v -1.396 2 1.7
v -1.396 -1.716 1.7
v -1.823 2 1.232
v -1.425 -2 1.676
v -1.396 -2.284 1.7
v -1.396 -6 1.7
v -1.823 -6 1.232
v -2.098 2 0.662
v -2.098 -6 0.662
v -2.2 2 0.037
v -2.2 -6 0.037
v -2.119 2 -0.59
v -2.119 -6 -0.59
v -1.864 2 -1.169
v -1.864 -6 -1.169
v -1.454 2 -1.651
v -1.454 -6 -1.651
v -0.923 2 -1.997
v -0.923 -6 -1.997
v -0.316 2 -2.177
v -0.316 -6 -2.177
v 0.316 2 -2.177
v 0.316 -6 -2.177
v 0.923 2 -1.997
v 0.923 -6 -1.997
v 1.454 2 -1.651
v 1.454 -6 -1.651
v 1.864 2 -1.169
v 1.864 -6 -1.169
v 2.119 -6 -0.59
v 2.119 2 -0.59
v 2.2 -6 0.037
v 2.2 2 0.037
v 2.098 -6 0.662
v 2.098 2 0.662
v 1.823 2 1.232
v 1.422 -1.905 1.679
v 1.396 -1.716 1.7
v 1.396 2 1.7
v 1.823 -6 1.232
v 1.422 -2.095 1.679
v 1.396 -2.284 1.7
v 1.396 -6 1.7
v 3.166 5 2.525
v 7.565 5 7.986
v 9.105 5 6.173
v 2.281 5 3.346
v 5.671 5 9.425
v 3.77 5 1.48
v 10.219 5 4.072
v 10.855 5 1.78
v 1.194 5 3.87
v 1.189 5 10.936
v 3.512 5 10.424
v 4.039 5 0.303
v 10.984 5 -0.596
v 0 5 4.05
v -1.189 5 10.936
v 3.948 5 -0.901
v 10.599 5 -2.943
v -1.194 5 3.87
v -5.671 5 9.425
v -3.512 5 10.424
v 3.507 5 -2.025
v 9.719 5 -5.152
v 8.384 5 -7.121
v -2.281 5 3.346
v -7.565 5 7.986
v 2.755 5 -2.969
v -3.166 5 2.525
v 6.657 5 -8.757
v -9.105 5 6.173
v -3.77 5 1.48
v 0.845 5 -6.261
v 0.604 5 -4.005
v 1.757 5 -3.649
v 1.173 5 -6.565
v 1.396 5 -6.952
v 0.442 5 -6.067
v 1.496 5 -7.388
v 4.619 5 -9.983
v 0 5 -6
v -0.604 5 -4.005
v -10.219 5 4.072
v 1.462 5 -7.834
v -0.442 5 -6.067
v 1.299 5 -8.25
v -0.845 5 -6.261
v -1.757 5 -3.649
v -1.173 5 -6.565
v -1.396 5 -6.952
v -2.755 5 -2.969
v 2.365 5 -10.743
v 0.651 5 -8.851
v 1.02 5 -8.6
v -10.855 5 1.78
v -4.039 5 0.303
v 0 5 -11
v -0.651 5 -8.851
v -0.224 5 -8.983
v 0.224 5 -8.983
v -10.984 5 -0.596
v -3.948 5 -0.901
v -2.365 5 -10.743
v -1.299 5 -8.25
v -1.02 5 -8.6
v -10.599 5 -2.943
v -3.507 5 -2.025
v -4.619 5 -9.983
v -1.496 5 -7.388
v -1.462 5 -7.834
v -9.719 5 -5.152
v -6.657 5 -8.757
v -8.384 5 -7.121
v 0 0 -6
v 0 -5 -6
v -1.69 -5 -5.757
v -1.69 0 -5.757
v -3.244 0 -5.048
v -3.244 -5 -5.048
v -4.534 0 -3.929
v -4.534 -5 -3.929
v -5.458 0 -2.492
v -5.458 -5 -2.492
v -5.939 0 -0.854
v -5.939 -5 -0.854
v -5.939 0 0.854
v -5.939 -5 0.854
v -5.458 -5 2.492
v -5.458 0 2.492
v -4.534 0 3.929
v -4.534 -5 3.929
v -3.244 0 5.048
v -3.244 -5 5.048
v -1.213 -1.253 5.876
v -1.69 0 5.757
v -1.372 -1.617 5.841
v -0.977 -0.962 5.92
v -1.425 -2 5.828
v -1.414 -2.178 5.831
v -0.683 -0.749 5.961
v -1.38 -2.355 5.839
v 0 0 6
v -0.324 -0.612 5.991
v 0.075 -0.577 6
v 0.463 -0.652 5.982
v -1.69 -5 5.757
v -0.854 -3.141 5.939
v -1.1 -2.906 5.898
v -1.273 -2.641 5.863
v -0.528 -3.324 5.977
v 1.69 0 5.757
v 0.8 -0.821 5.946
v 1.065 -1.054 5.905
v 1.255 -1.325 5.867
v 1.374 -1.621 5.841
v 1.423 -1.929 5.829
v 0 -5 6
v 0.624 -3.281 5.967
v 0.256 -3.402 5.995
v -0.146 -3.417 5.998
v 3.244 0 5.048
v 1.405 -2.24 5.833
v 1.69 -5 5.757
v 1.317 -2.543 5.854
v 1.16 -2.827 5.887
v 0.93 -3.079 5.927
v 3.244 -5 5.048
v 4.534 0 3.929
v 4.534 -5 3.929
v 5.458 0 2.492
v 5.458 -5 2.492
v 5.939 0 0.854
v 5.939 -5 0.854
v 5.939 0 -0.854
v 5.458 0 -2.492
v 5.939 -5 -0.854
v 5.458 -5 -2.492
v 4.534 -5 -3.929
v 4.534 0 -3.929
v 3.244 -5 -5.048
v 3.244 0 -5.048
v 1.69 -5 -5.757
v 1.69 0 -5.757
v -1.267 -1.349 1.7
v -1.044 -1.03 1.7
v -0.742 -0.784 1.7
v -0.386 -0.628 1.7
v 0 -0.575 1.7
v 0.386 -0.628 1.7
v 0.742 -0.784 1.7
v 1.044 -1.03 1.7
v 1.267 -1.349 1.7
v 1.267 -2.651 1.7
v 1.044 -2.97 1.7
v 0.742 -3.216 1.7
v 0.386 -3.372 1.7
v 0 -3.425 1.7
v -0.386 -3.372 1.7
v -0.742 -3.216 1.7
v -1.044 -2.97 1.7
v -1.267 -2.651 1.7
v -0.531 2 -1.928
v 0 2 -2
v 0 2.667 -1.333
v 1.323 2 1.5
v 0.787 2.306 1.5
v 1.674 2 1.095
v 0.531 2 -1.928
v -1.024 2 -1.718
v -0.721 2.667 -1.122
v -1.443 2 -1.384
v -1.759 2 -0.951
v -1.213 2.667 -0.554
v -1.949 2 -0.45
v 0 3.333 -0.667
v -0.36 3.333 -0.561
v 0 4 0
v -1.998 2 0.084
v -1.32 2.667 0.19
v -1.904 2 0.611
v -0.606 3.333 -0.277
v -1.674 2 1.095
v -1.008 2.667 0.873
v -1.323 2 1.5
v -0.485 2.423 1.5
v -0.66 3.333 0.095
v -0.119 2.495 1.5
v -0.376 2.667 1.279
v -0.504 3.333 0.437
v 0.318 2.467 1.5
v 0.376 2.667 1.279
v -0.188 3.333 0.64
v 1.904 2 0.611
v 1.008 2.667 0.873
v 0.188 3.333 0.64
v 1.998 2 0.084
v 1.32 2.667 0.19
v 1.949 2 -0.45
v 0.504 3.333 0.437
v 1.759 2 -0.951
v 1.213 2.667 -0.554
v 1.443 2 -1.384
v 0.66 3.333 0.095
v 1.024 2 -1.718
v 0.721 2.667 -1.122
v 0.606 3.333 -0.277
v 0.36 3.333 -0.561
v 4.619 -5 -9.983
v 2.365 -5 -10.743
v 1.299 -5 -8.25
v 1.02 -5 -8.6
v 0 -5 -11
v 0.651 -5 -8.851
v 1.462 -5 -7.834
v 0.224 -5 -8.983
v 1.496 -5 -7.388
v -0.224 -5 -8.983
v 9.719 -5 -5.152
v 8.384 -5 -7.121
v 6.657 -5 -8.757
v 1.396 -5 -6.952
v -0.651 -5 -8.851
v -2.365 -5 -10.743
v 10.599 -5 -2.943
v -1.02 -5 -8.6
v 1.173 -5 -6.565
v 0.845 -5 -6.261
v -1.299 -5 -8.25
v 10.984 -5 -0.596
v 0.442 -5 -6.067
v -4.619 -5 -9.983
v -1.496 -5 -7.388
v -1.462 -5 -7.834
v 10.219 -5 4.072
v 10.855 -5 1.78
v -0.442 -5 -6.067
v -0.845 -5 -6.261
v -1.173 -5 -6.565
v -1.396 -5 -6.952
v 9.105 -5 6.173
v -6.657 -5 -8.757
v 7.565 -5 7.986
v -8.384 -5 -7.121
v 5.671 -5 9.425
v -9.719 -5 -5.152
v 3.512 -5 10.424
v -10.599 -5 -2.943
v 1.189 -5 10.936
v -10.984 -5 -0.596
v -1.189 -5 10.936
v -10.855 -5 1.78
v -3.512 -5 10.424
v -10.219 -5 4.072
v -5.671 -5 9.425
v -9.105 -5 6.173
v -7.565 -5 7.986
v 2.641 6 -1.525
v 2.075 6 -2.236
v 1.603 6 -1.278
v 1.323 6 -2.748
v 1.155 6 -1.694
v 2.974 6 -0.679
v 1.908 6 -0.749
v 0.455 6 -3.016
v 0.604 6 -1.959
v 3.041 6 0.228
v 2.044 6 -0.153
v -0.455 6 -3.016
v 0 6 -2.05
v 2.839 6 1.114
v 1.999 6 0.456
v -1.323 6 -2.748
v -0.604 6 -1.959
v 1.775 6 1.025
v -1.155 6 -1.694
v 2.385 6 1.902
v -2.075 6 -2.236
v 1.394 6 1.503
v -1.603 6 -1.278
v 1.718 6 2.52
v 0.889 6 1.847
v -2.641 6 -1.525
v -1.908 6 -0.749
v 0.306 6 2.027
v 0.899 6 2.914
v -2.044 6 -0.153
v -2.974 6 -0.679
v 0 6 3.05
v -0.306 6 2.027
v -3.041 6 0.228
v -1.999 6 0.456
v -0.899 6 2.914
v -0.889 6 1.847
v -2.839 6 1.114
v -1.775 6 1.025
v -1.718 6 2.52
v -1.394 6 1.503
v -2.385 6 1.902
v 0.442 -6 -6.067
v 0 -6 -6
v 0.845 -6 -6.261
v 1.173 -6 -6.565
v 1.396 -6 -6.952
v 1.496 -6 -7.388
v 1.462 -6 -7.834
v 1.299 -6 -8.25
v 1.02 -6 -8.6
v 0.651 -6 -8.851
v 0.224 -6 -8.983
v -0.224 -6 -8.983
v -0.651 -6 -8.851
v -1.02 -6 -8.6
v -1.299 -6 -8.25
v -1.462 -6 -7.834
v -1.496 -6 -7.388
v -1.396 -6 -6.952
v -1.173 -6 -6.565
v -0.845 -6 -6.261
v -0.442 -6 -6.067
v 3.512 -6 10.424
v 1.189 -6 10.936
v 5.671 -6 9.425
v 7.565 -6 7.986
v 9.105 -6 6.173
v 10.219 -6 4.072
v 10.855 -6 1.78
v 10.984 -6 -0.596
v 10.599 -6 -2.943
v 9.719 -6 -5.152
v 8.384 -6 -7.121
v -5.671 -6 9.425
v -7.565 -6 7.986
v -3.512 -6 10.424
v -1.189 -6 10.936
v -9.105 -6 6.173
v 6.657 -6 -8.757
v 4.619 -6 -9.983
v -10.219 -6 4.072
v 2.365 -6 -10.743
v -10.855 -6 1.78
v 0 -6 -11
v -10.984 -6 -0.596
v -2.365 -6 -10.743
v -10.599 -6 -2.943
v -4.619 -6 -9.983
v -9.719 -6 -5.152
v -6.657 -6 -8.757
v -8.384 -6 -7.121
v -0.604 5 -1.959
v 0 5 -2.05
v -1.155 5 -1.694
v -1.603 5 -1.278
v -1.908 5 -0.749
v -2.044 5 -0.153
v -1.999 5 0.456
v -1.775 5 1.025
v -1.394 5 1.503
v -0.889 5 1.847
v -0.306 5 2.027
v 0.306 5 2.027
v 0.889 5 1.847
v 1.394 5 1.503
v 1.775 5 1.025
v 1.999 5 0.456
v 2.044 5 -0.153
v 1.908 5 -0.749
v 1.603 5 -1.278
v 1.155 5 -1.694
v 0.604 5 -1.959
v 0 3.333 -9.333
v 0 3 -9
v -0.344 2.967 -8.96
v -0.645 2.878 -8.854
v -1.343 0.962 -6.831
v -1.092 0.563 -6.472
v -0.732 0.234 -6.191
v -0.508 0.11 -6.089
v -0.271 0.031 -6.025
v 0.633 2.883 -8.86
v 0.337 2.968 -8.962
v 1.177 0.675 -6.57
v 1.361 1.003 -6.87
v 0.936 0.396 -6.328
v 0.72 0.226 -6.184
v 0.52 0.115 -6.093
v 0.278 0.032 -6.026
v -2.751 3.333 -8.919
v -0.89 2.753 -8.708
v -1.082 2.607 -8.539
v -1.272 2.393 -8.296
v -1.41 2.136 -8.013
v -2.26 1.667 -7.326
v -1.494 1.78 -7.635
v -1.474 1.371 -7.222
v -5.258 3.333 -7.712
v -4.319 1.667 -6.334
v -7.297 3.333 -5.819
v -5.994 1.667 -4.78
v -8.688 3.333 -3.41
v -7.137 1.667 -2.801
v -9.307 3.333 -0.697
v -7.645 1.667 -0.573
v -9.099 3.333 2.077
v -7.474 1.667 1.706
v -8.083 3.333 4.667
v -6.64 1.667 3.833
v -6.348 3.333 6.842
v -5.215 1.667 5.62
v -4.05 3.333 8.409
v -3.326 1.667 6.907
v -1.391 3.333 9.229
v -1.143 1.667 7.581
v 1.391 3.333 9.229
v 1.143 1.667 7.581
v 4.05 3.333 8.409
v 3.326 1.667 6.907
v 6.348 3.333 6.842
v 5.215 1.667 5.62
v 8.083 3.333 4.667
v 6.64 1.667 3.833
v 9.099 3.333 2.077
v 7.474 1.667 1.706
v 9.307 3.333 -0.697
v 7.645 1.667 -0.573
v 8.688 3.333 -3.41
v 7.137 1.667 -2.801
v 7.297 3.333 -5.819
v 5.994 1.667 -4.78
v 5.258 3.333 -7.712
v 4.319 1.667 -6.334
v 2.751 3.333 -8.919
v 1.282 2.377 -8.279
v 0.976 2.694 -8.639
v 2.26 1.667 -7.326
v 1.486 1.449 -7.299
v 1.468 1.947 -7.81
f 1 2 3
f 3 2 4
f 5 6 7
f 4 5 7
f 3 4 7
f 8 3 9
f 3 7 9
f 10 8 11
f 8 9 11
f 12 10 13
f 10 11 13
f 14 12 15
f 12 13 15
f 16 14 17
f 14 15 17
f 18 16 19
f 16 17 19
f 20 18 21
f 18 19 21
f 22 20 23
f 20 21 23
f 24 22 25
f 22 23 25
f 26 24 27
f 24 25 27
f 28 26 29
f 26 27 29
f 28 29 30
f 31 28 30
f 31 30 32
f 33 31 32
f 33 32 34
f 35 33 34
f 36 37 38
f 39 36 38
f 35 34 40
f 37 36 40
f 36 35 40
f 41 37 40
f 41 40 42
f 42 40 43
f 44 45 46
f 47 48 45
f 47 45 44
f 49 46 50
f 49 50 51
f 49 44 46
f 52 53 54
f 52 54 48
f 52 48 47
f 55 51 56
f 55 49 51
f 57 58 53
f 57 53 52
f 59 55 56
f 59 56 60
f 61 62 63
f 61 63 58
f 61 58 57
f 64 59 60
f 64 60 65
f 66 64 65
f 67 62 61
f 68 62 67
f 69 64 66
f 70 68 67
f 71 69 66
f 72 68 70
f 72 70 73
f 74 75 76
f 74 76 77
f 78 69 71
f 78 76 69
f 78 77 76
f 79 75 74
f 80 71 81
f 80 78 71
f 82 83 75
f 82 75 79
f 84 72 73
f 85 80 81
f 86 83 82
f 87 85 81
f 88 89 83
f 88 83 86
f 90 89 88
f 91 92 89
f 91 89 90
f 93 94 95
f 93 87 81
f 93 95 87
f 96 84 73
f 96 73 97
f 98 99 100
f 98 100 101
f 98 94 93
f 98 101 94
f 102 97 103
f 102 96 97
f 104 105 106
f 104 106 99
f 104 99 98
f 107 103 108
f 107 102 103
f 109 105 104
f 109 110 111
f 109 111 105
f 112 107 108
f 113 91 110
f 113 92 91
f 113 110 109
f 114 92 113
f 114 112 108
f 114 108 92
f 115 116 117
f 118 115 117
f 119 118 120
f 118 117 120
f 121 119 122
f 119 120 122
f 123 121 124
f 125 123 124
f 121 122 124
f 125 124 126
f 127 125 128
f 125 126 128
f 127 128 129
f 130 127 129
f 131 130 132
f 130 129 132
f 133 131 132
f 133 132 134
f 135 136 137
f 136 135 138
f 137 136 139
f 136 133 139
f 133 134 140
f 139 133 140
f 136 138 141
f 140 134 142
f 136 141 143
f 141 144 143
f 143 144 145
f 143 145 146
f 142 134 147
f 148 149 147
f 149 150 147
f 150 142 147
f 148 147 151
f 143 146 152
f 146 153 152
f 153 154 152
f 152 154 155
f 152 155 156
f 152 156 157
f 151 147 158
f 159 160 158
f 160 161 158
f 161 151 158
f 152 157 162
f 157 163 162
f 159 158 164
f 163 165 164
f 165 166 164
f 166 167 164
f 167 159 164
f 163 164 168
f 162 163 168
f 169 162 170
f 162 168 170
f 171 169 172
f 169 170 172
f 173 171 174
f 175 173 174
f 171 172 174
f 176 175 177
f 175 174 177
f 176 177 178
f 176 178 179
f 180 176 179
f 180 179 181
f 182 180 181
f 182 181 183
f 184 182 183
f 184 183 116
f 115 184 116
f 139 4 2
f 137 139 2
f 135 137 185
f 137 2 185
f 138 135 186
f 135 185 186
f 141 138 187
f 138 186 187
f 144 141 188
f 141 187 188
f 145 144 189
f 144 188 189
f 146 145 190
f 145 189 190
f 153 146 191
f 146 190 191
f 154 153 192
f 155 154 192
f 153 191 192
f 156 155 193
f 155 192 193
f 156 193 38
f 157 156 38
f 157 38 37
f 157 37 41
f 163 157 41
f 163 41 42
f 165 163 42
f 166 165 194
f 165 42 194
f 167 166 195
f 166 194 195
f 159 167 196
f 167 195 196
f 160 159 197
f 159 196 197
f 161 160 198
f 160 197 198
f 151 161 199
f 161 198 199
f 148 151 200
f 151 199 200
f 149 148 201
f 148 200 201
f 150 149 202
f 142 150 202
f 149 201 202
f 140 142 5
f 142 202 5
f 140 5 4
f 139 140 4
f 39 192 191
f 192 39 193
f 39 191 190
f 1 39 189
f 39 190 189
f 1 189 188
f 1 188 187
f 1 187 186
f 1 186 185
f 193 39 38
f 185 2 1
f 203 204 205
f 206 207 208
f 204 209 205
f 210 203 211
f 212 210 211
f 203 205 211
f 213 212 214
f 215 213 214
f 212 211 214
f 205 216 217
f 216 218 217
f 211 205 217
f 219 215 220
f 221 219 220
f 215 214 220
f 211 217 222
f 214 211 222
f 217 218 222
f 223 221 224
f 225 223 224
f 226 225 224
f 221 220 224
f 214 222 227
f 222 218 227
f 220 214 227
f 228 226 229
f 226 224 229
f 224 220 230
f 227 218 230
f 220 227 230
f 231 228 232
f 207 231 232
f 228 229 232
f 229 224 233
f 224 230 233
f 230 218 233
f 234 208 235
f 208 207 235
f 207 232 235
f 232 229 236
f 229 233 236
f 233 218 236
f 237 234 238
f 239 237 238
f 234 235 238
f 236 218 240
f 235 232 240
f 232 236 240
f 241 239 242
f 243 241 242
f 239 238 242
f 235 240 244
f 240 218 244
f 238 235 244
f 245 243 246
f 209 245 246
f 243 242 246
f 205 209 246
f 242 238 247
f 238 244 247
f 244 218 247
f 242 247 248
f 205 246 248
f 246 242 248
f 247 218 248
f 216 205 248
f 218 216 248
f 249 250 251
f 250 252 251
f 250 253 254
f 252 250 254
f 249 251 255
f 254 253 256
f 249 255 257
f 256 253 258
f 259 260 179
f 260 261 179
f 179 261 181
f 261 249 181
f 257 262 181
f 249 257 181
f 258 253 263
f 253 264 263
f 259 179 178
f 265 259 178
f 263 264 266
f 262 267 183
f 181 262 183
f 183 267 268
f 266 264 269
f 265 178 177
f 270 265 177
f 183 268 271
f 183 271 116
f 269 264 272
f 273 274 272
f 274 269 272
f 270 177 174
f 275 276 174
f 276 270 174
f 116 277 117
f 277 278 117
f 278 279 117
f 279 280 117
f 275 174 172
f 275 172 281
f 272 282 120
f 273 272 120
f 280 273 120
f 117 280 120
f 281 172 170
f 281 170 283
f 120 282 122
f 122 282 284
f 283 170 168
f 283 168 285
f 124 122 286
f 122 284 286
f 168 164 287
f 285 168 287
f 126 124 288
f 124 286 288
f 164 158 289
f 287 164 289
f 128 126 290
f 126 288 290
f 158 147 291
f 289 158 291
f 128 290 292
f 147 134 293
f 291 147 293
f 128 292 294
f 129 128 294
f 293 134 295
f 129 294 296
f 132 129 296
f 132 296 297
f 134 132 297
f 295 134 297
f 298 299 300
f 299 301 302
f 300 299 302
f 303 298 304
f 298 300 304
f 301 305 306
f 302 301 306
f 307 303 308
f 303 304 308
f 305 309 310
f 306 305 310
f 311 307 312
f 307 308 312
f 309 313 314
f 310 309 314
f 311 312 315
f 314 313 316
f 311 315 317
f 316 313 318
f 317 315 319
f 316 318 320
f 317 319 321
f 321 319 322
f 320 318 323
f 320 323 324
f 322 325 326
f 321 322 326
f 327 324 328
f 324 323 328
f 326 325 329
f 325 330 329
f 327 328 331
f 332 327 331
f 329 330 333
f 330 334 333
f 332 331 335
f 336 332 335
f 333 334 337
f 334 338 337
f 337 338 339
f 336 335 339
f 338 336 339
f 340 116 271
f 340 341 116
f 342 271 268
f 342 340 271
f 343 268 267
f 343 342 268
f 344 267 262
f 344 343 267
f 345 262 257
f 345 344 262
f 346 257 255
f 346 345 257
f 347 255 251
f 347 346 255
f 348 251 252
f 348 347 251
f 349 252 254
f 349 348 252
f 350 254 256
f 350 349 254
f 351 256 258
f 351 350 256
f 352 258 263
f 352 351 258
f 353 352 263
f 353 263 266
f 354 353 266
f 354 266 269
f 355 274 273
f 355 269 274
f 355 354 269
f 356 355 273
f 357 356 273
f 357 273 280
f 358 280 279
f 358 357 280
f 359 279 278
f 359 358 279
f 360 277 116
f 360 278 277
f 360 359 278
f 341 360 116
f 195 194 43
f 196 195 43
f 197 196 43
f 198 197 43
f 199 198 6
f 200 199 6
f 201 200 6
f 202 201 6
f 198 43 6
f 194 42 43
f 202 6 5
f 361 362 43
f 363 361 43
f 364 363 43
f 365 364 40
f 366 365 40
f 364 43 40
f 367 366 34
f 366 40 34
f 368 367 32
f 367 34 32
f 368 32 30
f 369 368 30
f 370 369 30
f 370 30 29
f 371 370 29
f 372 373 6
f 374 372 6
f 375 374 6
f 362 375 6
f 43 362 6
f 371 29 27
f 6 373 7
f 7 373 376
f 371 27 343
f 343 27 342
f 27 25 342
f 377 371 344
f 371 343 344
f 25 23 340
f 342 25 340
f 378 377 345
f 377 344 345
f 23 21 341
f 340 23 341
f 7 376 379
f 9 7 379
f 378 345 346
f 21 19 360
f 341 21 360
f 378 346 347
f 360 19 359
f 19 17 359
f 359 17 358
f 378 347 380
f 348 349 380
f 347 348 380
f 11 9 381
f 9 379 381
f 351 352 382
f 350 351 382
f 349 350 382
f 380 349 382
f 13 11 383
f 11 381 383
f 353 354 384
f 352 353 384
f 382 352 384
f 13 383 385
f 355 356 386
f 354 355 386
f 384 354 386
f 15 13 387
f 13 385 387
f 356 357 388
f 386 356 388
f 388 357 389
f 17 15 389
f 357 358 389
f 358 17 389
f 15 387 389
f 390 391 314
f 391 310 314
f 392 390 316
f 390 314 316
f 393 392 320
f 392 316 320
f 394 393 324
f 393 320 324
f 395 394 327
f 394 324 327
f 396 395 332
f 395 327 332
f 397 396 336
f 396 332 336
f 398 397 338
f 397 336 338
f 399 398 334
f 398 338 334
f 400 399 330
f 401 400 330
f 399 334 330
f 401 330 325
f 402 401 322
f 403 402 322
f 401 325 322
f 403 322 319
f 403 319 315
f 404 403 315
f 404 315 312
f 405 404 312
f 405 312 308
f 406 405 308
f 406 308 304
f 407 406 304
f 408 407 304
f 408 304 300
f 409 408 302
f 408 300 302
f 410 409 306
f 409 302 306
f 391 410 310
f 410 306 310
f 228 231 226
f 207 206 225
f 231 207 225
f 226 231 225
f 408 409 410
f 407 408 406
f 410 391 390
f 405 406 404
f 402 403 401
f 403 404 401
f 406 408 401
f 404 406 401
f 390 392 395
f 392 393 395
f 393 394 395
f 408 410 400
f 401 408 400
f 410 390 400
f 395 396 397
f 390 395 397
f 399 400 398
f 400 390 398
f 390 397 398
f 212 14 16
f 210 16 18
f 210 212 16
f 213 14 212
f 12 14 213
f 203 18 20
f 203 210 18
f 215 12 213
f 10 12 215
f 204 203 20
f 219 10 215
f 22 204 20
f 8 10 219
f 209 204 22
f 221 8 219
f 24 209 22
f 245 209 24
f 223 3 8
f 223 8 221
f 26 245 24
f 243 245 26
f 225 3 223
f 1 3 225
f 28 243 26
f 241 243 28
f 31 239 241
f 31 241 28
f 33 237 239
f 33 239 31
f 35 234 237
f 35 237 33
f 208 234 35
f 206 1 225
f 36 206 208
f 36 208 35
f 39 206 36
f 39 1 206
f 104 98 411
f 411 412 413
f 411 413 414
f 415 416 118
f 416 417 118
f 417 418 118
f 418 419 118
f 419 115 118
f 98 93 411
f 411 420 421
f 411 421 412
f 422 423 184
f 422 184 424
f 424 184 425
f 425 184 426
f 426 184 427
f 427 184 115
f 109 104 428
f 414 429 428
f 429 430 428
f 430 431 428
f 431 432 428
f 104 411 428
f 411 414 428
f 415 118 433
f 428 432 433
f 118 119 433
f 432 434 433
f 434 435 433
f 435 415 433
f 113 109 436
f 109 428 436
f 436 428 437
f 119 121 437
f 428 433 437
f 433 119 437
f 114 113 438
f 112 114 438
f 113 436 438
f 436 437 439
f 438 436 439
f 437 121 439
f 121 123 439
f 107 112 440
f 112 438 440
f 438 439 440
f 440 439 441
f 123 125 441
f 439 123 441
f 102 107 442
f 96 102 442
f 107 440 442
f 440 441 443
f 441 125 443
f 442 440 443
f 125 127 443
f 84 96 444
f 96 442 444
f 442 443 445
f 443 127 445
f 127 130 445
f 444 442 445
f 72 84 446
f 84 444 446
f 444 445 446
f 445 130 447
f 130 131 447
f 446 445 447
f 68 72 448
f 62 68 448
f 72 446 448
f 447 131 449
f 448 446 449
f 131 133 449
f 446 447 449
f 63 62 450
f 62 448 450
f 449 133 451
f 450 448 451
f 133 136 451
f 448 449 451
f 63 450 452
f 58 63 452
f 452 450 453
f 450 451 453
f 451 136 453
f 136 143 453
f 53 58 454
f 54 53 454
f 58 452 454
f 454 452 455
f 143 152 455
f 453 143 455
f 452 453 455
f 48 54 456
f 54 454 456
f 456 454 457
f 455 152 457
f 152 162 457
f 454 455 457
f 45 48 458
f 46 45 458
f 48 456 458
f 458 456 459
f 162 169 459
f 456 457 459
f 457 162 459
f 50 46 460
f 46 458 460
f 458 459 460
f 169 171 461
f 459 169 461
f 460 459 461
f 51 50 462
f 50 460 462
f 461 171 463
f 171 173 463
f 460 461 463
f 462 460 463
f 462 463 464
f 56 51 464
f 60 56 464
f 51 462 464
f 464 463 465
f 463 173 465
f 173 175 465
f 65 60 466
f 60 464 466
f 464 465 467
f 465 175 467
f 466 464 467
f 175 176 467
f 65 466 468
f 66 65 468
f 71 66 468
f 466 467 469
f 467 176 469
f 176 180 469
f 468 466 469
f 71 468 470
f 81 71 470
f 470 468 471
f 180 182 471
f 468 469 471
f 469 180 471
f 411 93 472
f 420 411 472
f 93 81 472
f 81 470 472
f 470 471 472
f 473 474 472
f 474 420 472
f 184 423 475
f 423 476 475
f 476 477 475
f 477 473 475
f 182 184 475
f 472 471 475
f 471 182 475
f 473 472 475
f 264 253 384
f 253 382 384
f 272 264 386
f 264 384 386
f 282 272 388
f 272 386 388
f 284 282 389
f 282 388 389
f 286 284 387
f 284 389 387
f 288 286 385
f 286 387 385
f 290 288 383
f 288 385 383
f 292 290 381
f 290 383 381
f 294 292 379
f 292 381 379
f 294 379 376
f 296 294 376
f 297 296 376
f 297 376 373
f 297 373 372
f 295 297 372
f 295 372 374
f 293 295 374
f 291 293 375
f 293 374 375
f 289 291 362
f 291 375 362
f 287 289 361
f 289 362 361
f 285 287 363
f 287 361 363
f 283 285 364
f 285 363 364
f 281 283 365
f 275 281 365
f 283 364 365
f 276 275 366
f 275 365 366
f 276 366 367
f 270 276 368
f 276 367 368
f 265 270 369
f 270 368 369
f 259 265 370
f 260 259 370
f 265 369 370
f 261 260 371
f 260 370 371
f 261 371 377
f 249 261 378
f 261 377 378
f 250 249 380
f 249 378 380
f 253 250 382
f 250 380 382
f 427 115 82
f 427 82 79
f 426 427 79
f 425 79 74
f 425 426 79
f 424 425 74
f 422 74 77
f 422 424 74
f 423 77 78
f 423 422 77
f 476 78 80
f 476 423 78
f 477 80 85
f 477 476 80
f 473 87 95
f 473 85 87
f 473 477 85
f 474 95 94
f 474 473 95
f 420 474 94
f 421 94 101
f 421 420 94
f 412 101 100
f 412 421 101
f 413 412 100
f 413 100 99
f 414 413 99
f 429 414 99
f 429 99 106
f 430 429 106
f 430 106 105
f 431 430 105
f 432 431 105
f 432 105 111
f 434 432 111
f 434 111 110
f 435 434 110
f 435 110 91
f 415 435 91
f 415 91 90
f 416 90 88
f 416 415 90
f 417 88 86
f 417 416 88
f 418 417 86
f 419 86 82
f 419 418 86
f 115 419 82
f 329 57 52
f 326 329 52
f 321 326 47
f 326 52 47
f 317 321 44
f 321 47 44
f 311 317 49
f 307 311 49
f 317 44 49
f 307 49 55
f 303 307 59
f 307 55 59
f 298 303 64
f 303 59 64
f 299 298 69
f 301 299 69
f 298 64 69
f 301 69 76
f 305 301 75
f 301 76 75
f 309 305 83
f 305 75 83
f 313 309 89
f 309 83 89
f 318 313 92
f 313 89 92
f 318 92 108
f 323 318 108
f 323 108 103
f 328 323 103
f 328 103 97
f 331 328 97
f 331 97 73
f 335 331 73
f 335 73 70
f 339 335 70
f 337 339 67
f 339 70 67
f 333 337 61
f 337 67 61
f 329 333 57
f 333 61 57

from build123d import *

# Parameters (mm, degrees)
FLAT_GROVE_EXTRUDE_REACH   = 21.647
WIRE_HOLE_CUT_DEPTH        = 20.052558883
WIRE_HOLE_CUT_DEPTH_BACK   = 20.052558883
SKETCH5_R                  = 1.5
SKETCH6_R                  = 1.425
SET_SCREW_CUT_DEPTH        = 18.698870187
MAGNET_START               = -1
SKETCH8_R                  = 11
SKETCH8_R_2                = 3.05
MAGNET_HOLDER_TRIM_DEPTH   = 1
MAGNET_HOLDER_CHAMFER_SIZE = 1
AXLE_TOLERANCE_CUT_DEPTH   = 8


with BuildPart() as part:
    # Sketch1 → Spool Solid (revolve)
    with BuildSketch(Plane(origin=(0, 0, 0), x_dir=(0, 0, -1), z_dir=(1, 0, 0)), mode=Mode.PRIVATE) as spool_solid_sk:
        Polygon((-2.05, 6), (-11, 6), (-11, 5), (-6, 0), (-6, -5), (-11, -5), (-11, -6), (-2, -6), (-2, 2), (0, 4), (0, 5), (-2.05, 5), align=None)
    revolve(spool_solid_sk.sketch.rotate(Axis((0, 0, 0), (0, 1, 0)), 180), axis=Axis((0, 0, 0), (0, 1, 0)))

    # Flat Grove Extrude: up to this cone (the profile starts inside it)
    flat_grove_extrude_end = Plane(origin=(0, -6, 0), z_dir=(0, -1, 0)).offset(-9.999999) * Cone(1e-06, 42.147, 42.146999, align=(Align.CENTER, Align.CENTER, Align.MIN), mode=Mode.PRIVATE)
    # Sketch2 → Flat Grove Extrude (add, up to the surface)
    with BuildSketch(Plane.XZ.offset(6), mode=Mode.PRIVATE) as flat_grove_extrude_sk1:
        with BuildLine():
            Line((1.322875656, 1.5), (-1.322875656, 1.5))
            ThreePointArc((-1.322875656, 1.5), (0, 2), (1.322875656, 1.5))
        make_face()
    flat_grove_extrude_tool1 = extrude(flat_grove_extrude_sk1.sketch, amount=-FLAT_GROVE_EXTRUDE_REACH, mode=Mode.PRIVATE) & flat_grove_extrude_end
    add(flat_grove_extrude_tool1.solids().sort_by_distance((0, -6, 1.702311))[0])

    # Sketch5 → Wire Hole Cut (cut, two sides: drawn at the far end of the back side and taken through both)
    with BuildSketch(Plane(origin=(0, -5, 0), x_dir=(1, 0, 0), z_dir=(0, 1, 0)).offset(-WIRE_HOLE_CUT_DEPTH_BACK)):
        with Locations(Location((0, 7.5, 0), (0, 0, 270))):
            Circle(SKETCH5_R)
    extrude(amount=WIRE_HOLE_CUT_DEPTH + WIRE_HOLE_CUT_DEPTH_BACK, mode=Mode.SUBTRACT)

    # Sketch6 → Set Screw Cut (cut, through all)
    with BuildSketch(Plane(origin=(0, 0, 1.5), x_dir=(-1, 0, 0), z_dir=(0, 0, -1))):
        with Locations((0, -2)):
            Circle(SKETCH6_R)
    extrude(amount=-SET_SCREW_CUT_DEPTH, mode=Mode.SUBTRACT)

    # Sketch8 → Magnet Holder Trim (cut)
    with BuildSketch(Plane(origin=(0, 6, 0), x_dir=(1, 0, 0), z_dir=(0, 1, 0)).offset(MAGNET_START)):
        with Locations(Location((0, 0, 0), (0, 0, 90))):
            Circle(SKETCH8_R)
        with Locations(Location((0, 0, 0), (0, 0, 270))):
            Circle(SKETCH8_R_2, mode=Mode.SUBTRACT)
    extrude(amount=MAGNET_HOLDER_TRIM_DEPTH, mode=Mode.SUBTRACT)

    # Magnet Holder Chamfer
    magnet_holder_chamfer_edges = [part.edges().sort_by_distance(p)[0] for p in [
        (0, 5, -3.05),
    ]]
    chamfer(magnet_holder_chamfer_edges, length=MAGNET_HOLDER_CHAMFER_SIZE - 0.0001)  # a hair under: the kernel refuses the full size

    # Sketch9 → Axle Tolerance Cut (cut)
    with BuildSketch(Plane.XZ.offset(6)):
        with BuildLine():
            Line((1.396424004, 1.7), (-1.396424004, 1.7))
            ThreePointArc((-1.396424004, 1.7), (0, -2.2), (1.396424004, 1.7))
        make_face()
    extrude(amount=-AXLE_TOLERANCE_CUT_DEPTH, mode=Mode.SUBTRACT)


solid = part.part
